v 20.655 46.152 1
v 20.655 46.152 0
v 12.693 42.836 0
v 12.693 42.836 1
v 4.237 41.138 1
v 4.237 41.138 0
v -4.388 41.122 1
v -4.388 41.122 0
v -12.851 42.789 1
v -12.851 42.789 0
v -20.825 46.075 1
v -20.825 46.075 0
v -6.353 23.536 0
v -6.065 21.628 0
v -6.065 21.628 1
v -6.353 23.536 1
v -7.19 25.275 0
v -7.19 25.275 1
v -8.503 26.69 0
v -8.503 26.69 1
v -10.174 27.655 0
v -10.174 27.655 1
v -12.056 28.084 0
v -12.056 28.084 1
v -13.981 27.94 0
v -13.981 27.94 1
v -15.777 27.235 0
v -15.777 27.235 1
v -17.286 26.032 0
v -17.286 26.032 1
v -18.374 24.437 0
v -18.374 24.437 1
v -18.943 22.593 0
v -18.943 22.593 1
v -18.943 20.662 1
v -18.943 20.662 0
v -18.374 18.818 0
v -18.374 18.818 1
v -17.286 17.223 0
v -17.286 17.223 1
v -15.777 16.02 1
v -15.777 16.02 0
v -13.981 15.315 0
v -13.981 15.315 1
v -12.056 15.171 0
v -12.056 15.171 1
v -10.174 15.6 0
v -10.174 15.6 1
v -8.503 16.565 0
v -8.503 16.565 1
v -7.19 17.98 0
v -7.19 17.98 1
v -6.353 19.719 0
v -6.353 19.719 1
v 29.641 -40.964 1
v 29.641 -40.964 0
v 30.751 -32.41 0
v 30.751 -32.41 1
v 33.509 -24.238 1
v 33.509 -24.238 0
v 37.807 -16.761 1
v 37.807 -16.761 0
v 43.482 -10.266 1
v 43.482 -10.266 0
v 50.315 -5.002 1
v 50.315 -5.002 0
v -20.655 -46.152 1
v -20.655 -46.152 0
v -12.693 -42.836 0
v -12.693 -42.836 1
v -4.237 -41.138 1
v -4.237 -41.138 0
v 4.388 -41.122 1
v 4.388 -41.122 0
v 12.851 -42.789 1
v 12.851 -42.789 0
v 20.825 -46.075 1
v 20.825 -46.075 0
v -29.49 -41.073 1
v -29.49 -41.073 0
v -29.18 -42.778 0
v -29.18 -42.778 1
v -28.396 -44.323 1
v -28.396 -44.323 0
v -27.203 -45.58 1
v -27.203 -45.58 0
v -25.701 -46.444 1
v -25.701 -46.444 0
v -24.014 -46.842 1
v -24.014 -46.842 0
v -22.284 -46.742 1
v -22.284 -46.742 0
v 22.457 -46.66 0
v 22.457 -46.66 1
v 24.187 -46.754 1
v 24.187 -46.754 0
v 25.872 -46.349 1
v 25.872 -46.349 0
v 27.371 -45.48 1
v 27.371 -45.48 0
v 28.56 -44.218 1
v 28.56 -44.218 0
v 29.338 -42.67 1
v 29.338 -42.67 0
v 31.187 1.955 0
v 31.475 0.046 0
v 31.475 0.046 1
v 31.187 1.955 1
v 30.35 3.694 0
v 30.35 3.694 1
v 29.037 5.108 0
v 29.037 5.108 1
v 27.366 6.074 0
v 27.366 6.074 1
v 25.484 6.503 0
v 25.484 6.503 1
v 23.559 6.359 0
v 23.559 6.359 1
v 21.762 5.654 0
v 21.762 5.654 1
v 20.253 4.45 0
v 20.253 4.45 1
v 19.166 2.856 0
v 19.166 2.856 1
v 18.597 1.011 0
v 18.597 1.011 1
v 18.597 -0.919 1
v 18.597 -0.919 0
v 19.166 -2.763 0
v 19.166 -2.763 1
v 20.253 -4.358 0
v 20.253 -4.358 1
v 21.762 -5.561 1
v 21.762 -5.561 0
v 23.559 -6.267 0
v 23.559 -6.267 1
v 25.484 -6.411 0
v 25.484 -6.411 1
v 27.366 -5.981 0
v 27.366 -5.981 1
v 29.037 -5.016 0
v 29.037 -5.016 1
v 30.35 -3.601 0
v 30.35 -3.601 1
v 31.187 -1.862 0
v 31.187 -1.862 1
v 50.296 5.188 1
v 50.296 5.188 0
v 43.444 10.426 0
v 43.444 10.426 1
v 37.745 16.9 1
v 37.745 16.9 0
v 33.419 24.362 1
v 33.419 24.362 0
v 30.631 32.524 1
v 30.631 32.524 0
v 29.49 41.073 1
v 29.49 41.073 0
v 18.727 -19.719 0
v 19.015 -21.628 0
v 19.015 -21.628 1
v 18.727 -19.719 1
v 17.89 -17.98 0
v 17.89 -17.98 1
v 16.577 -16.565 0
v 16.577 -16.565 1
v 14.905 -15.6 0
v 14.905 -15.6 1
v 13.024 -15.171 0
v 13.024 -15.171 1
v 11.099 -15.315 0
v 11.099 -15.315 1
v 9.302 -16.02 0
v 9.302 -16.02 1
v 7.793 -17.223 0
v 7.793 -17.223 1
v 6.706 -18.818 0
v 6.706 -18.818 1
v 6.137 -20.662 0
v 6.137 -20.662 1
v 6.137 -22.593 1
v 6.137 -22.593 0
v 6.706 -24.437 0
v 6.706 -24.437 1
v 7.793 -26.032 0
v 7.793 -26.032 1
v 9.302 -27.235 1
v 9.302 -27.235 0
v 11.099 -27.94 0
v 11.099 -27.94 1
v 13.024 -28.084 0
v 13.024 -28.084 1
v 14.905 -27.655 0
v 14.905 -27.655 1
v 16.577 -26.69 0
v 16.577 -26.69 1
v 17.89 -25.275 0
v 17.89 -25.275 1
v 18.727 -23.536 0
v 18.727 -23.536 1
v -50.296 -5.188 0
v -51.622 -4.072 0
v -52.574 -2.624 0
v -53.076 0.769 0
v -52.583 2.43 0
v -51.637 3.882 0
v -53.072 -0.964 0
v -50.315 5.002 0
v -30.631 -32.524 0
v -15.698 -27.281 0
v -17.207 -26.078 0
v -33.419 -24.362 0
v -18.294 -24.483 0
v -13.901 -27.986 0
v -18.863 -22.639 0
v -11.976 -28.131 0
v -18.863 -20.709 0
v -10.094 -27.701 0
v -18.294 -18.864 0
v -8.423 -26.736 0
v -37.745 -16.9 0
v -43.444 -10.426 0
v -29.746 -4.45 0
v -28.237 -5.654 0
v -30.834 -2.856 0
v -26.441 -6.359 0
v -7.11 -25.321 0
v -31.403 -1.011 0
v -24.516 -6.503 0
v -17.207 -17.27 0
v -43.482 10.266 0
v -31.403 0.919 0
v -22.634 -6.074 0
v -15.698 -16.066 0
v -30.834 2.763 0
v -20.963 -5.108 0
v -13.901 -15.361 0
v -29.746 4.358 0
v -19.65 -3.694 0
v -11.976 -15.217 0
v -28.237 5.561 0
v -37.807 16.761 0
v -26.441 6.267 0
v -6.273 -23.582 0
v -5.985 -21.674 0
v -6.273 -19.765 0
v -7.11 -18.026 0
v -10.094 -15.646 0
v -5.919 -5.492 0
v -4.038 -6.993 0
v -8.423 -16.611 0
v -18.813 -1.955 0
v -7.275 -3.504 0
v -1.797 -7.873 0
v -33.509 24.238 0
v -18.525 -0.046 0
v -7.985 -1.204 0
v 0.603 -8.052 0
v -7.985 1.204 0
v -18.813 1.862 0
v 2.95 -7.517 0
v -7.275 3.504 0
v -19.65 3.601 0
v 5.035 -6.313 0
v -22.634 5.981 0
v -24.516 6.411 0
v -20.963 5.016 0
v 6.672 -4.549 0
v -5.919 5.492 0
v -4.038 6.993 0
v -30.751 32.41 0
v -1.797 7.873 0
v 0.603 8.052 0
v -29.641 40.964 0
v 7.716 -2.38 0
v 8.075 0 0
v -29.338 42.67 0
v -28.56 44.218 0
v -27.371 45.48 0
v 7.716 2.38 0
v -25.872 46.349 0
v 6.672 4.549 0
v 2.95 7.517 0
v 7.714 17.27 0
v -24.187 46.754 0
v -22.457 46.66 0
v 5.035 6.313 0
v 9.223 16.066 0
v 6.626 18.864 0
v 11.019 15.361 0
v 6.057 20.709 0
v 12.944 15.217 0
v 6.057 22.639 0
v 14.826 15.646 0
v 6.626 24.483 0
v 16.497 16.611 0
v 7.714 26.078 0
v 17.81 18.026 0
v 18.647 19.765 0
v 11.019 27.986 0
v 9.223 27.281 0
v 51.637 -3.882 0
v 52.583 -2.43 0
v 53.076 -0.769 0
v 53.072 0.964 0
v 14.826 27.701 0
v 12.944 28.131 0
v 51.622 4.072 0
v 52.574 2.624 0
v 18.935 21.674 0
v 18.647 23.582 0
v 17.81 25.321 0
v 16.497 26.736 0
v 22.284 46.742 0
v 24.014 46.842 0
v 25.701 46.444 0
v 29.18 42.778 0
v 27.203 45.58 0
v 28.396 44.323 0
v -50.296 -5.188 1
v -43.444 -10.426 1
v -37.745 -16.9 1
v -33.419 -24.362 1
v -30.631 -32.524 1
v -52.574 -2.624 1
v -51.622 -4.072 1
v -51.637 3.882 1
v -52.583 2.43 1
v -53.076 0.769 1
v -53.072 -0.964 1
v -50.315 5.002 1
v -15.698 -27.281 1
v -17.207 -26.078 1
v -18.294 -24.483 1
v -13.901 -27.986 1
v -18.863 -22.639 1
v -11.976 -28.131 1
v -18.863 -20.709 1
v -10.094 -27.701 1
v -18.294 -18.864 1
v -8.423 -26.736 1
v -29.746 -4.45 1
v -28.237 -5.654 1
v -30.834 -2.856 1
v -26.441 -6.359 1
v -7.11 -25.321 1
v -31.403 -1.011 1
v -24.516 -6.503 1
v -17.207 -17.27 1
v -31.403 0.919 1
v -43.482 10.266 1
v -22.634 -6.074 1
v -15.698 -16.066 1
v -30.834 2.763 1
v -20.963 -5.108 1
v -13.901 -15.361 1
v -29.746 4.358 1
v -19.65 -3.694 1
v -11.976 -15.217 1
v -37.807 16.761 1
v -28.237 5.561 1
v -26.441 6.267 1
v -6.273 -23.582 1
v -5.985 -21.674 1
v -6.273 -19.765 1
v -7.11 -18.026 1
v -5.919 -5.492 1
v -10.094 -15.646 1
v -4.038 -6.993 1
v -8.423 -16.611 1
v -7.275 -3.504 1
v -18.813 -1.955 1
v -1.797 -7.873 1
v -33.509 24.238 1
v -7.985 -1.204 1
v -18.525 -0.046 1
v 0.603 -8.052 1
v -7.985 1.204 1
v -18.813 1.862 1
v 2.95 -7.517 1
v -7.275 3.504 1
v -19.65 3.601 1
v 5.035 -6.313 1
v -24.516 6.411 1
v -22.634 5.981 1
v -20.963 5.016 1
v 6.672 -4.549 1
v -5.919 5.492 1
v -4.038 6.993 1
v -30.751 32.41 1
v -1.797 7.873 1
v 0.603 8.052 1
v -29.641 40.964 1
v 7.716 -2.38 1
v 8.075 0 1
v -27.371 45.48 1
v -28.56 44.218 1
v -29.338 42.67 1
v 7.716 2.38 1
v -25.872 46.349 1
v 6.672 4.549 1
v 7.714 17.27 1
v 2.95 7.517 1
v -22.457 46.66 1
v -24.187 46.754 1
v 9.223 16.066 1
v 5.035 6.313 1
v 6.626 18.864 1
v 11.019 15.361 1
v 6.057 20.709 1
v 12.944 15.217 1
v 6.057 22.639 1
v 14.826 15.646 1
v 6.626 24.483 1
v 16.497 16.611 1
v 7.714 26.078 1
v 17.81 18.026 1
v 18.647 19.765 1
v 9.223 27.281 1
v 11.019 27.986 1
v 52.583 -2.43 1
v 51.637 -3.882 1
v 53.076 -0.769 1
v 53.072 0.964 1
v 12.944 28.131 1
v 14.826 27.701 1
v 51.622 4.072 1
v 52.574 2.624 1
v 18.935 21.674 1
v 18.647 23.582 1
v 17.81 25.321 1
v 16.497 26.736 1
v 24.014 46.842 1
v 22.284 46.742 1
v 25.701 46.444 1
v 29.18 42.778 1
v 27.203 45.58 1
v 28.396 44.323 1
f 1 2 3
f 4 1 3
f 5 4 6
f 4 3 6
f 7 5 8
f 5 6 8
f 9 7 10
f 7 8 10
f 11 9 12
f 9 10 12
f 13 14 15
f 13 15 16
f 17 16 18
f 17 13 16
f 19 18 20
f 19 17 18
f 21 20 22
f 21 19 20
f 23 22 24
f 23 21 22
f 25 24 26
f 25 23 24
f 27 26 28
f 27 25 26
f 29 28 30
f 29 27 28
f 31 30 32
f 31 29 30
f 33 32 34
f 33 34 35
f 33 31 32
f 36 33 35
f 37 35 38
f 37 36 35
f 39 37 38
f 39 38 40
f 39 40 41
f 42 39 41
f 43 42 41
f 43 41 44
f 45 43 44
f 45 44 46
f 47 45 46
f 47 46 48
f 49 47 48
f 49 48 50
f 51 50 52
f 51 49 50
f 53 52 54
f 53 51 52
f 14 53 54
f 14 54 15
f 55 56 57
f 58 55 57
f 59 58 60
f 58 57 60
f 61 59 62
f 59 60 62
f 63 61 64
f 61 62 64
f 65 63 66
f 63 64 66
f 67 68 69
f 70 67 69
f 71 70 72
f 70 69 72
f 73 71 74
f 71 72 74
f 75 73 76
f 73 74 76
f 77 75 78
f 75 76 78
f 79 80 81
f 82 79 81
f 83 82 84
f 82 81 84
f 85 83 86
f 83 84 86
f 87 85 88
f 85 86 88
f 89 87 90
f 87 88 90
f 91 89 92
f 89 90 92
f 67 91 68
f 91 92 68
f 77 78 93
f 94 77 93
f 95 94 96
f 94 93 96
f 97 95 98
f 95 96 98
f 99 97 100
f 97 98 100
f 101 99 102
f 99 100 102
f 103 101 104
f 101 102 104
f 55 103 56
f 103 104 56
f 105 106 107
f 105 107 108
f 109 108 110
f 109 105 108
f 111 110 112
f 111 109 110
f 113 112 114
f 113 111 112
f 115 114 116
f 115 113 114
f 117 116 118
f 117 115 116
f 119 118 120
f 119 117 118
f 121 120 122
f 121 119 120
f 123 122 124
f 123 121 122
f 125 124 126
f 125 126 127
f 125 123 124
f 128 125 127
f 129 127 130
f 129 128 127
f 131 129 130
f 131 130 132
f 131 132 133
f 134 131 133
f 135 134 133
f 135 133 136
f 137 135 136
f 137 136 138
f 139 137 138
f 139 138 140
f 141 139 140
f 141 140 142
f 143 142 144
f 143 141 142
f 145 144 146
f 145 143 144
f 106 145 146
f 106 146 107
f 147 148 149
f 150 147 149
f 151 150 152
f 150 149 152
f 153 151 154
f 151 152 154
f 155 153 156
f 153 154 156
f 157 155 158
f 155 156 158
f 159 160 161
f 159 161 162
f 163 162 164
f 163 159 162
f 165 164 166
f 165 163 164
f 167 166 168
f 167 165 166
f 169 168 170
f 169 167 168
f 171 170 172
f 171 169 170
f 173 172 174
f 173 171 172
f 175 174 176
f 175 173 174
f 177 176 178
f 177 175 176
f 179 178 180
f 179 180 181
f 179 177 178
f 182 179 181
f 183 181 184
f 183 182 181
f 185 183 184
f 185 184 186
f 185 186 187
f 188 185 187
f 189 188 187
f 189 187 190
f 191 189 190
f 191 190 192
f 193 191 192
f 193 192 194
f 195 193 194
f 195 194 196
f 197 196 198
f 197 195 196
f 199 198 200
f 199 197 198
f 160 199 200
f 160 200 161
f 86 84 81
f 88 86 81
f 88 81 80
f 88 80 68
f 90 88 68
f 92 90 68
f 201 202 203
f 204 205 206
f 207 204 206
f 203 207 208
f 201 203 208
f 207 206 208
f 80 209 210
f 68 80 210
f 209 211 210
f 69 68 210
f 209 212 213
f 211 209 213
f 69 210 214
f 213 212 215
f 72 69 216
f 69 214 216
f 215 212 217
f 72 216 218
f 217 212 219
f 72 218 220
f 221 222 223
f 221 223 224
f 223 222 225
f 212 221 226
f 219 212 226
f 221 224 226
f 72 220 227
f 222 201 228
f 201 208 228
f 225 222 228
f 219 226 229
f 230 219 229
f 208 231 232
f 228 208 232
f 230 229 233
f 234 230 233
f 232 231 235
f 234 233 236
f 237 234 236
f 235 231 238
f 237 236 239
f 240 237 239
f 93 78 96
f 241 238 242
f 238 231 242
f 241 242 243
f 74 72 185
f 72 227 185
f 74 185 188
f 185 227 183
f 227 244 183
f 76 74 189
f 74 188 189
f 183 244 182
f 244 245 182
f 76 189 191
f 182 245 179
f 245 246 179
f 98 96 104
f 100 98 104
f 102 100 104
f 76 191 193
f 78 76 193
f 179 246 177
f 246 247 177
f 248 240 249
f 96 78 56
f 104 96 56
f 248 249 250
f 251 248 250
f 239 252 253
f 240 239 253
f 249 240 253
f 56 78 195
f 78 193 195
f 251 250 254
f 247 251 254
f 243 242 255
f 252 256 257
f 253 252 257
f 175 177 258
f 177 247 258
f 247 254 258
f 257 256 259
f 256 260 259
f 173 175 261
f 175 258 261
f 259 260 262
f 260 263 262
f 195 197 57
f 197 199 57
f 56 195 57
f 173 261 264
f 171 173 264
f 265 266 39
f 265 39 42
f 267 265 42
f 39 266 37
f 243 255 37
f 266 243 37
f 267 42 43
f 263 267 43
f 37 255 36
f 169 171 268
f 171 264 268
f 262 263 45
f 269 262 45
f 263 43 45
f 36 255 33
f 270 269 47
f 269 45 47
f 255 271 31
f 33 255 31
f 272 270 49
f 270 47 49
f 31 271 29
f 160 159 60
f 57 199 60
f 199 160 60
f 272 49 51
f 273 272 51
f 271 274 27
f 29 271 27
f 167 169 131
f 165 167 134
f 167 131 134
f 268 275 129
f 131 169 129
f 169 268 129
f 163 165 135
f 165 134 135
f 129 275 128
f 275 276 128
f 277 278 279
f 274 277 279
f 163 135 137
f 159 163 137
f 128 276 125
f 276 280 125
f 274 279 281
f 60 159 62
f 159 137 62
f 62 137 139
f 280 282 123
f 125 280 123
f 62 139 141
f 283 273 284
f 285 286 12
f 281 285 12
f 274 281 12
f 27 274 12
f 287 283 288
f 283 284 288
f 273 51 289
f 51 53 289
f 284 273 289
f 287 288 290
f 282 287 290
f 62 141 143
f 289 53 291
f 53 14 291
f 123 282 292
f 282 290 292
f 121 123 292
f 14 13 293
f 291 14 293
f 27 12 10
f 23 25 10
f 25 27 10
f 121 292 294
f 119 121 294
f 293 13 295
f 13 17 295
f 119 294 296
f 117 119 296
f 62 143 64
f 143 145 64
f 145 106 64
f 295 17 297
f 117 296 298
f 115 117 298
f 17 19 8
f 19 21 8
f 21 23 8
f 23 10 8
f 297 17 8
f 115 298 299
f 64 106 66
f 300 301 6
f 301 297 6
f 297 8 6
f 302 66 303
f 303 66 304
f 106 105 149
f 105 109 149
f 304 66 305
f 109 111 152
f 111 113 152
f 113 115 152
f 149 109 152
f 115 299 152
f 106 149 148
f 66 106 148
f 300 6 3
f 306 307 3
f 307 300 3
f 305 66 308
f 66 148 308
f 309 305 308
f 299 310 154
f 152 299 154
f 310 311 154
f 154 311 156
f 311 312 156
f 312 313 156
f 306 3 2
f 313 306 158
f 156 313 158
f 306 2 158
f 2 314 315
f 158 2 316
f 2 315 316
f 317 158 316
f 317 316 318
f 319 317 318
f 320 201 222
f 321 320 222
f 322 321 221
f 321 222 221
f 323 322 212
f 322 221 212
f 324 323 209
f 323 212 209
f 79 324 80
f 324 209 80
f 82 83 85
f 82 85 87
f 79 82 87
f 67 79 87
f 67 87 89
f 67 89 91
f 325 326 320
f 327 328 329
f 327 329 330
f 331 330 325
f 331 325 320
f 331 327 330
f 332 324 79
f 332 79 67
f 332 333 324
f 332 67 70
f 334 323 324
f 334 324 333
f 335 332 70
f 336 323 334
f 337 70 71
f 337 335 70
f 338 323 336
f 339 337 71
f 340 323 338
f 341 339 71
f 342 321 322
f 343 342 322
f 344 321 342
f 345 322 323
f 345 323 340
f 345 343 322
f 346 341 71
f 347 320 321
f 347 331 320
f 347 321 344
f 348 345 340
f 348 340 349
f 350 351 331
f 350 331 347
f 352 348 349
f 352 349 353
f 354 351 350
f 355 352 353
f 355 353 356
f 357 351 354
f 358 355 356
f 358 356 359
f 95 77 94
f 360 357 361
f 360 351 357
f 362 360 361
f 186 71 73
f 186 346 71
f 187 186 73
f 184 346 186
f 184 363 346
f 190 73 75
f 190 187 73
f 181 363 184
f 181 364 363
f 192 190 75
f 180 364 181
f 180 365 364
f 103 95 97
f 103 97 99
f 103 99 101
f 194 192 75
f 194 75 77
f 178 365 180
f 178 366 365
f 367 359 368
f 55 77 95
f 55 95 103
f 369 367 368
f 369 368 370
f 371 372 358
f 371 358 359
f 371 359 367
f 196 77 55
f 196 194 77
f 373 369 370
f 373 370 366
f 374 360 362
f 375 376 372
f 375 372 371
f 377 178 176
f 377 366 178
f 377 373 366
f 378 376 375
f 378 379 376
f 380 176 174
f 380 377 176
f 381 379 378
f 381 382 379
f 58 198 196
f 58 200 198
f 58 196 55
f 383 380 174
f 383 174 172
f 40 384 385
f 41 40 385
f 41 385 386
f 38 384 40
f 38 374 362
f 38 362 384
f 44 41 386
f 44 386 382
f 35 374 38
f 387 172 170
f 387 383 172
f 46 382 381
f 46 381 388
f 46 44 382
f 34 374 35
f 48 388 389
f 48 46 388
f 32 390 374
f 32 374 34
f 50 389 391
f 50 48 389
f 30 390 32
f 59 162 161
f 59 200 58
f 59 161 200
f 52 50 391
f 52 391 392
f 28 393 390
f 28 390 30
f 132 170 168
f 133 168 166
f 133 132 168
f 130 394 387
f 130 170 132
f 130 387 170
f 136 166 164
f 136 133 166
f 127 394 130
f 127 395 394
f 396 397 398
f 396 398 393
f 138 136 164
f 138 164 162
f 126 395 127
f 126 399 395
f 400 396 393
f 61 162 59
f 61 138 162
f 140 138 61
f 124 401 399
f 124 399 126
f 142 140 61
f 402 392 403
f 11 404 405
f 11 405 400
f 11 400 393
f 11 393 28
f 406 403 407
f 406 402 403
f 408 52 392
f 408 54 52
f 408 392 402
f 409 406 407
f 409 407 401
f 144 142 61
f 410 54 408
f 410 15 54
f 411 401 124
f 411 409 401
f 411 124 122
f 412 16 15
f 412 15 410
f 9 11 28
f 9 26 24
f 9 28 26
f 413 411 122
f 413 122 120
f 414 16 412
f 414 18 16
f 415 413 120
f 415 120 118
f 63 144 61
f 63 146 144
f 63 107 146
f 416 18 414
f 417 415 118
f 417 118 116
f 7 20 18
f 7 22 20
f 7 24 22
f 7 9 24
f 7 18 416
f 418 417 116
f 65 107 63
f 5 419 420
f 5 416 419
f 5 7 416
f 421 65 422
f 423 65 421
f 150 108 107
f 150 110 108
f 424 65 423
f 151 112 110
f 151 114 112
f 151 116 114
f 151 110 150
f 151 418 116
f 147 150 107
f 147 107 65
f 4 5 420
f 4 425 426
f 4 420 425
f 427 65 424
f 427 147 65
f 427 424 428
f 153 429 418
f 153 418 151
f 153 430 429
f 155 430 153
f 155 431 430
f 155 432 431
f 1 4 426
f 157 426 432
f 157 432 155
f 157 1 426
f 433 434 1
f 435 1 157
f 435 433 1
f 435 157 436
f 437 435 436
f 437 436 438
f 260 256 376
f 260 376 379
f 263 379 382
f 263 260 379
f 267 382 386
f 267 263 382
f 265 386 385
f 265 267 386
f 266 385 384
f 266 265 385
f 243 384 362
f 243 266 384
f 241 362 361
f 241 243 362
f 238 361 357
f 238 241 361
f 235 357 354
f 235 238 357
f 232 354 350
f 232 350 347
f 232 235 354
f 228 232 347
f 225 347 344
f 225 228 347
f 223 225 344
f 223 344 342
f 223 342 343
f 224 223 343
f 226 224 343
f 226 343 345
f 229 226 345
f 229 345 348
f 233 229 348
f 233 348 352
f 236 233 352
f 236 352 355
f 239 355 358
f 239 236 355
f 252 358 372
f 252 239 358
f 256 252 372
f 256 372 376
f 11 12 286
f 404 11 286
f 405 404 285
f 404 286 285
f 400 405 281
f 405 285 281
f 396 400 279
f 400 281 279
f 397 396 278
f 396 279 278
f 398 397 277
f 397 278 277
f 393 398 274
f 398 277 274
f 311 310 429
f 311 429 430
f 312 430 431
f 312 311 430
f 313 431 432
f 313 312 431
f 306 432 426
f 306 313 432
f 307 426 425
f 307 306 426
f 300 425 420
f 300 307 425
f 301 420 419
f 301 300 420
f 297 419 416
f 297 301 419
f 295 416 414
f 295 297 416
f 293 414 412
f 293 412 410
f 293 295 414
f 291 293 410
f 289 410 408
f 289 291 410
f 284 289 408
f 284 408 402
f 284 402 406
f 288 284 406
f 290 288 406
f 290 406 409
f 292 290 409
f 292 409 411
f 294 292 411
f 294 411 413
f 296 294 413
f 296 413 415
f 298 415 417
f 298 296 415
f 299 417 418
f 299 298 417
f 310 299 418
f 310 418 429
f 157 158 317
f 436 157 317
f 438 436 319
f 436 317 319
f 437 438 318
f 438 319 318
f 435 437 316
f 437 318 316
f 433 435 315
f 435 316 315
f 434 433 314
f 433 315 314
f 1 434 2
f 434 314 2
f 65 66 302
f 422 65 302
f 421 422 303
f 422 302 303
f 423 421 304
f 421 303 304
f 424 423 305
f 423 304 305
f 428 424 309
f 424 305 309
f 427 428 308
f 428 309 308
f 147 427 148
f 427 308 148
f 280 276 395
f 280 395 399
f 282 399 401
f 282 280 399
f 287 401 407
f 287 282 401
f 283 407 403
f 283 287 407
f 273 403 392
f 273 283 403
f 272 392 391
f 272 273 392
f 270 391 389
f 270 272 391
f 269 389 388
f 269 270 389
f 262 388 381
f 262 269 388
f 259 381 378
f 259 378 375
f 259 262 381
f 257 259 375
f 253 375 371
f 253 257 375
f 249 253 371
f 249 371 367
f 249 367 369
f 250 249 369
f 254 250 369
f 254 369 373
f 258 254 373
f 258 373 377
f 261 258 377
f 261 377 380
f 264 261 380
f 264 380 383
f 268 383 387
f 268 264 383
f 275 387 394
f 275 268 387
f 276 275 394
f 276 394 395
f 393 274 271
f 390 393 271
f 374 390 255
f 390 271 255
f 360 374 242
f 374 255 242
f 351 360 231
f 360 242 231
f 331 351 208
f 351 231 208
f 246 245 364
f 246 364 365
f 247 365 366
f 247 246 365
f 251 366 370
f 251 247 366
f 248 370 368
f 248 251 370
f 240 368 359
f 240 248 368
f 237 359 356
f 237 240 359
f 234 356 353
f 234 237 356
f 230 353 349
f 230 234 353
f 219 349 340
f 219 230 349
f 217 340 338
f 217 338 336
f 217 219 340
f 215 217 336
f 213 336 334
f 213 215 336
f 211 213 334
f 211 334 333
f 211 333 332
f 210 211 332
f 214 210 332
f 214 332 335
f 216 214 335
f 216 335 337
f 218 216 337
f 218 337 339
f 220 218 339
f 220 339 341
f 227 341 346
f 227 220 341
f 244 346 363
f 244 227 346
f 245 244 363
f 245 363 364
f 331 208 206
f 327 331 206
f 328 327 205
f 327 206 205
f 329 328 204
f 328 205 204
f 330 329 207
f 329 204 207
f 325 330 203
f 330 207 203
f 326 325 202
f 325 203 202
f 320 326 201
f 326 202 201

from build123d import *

# Parameters (mm, degrees)
F0_R     = 6.475
F0_R_2   = 8.075
F1_DEPTH = 1


with BuildPart() as f1:
    # F0 (on Top) → F1 (new body)
    with BuildSketch(Plane.XY):
        with BuildLine():
            ThreePointArc((20.655149, 46.151557), (-0.075475, 40.918495), (-20.825263, 46.075046))
            ThreePointArc((-20.825263, 46.075046), (-26.653292, 45.968832), (-29.640847, 40.963663))
            ThreePointArc((-29.640847, 40.963663), (-35.474194, 20.393884), (-50.314792, 5.002316))
            ThreePointArc((-50.314792, 5.002316), (-53.136822, -0.098012), (-50.295996, -5.187895))
            ThreePointArc((-50.295996, -5.187895), (-35.398719, -20.524611), (-29.489529, -41.07273))
            ThreePointArc((-29.489529, -41.07273), (-26.48353, -46.066844), (-20.655149, -46.151557))
            ThreePointArc((-20.655149, -46.151557), (0.075475, -40.918495), (20.825263, -46.075046))
            ThreePointArc((20.825263, -46.075046), (26.653292, -45.968832), (29.640847, -40.963663))
            ThreePointArc((29.640847, -40.963663), (35.474194, -20.393884), (50.314792, -5.002316))
            ThreePointArc((50.314792, -5.002316), (53.136822, 0.098012), (50.295996, 5.187895))
            ThreePointArc((50.295996, 5.187895), (35.398719, 20.524611), (29.489529, 41.07273))
            ThreePointArc((29.489529, 41.07273), (26.48353, 46.066844), (20.655149, 46.151557))
        make_face()
        with Locations((-12.460044, -21.673655)):
            Circle(F0_R, mode=Mode.SUBTRACT)
        with Locations((-24.999957, -0.046113)):
            Circle(F0_R, mode=Mode.SUBTRACT)
        with Locations((12.539914, -21.627542)):
            Circle(F0_R, mode=Mode.SUBTRACT)
        with Locations((-12.539914, 21.627542)):
            Circle(F0_R, mode=Mode.SUBTRACT)
        Circle(F0_R_2, mode=Mode.SUBTRACT)
        with Locations((24.999957, 0.046113)):
            Circle(F0_R, mode=Mode.SUBTRACT)
        with Locations((12.460044, 21.673655)):
            Circle(F0_R, mode=Mode.SUBTRACT)
    extrude(amount=F1_DEPTH)


solid = f1.part
